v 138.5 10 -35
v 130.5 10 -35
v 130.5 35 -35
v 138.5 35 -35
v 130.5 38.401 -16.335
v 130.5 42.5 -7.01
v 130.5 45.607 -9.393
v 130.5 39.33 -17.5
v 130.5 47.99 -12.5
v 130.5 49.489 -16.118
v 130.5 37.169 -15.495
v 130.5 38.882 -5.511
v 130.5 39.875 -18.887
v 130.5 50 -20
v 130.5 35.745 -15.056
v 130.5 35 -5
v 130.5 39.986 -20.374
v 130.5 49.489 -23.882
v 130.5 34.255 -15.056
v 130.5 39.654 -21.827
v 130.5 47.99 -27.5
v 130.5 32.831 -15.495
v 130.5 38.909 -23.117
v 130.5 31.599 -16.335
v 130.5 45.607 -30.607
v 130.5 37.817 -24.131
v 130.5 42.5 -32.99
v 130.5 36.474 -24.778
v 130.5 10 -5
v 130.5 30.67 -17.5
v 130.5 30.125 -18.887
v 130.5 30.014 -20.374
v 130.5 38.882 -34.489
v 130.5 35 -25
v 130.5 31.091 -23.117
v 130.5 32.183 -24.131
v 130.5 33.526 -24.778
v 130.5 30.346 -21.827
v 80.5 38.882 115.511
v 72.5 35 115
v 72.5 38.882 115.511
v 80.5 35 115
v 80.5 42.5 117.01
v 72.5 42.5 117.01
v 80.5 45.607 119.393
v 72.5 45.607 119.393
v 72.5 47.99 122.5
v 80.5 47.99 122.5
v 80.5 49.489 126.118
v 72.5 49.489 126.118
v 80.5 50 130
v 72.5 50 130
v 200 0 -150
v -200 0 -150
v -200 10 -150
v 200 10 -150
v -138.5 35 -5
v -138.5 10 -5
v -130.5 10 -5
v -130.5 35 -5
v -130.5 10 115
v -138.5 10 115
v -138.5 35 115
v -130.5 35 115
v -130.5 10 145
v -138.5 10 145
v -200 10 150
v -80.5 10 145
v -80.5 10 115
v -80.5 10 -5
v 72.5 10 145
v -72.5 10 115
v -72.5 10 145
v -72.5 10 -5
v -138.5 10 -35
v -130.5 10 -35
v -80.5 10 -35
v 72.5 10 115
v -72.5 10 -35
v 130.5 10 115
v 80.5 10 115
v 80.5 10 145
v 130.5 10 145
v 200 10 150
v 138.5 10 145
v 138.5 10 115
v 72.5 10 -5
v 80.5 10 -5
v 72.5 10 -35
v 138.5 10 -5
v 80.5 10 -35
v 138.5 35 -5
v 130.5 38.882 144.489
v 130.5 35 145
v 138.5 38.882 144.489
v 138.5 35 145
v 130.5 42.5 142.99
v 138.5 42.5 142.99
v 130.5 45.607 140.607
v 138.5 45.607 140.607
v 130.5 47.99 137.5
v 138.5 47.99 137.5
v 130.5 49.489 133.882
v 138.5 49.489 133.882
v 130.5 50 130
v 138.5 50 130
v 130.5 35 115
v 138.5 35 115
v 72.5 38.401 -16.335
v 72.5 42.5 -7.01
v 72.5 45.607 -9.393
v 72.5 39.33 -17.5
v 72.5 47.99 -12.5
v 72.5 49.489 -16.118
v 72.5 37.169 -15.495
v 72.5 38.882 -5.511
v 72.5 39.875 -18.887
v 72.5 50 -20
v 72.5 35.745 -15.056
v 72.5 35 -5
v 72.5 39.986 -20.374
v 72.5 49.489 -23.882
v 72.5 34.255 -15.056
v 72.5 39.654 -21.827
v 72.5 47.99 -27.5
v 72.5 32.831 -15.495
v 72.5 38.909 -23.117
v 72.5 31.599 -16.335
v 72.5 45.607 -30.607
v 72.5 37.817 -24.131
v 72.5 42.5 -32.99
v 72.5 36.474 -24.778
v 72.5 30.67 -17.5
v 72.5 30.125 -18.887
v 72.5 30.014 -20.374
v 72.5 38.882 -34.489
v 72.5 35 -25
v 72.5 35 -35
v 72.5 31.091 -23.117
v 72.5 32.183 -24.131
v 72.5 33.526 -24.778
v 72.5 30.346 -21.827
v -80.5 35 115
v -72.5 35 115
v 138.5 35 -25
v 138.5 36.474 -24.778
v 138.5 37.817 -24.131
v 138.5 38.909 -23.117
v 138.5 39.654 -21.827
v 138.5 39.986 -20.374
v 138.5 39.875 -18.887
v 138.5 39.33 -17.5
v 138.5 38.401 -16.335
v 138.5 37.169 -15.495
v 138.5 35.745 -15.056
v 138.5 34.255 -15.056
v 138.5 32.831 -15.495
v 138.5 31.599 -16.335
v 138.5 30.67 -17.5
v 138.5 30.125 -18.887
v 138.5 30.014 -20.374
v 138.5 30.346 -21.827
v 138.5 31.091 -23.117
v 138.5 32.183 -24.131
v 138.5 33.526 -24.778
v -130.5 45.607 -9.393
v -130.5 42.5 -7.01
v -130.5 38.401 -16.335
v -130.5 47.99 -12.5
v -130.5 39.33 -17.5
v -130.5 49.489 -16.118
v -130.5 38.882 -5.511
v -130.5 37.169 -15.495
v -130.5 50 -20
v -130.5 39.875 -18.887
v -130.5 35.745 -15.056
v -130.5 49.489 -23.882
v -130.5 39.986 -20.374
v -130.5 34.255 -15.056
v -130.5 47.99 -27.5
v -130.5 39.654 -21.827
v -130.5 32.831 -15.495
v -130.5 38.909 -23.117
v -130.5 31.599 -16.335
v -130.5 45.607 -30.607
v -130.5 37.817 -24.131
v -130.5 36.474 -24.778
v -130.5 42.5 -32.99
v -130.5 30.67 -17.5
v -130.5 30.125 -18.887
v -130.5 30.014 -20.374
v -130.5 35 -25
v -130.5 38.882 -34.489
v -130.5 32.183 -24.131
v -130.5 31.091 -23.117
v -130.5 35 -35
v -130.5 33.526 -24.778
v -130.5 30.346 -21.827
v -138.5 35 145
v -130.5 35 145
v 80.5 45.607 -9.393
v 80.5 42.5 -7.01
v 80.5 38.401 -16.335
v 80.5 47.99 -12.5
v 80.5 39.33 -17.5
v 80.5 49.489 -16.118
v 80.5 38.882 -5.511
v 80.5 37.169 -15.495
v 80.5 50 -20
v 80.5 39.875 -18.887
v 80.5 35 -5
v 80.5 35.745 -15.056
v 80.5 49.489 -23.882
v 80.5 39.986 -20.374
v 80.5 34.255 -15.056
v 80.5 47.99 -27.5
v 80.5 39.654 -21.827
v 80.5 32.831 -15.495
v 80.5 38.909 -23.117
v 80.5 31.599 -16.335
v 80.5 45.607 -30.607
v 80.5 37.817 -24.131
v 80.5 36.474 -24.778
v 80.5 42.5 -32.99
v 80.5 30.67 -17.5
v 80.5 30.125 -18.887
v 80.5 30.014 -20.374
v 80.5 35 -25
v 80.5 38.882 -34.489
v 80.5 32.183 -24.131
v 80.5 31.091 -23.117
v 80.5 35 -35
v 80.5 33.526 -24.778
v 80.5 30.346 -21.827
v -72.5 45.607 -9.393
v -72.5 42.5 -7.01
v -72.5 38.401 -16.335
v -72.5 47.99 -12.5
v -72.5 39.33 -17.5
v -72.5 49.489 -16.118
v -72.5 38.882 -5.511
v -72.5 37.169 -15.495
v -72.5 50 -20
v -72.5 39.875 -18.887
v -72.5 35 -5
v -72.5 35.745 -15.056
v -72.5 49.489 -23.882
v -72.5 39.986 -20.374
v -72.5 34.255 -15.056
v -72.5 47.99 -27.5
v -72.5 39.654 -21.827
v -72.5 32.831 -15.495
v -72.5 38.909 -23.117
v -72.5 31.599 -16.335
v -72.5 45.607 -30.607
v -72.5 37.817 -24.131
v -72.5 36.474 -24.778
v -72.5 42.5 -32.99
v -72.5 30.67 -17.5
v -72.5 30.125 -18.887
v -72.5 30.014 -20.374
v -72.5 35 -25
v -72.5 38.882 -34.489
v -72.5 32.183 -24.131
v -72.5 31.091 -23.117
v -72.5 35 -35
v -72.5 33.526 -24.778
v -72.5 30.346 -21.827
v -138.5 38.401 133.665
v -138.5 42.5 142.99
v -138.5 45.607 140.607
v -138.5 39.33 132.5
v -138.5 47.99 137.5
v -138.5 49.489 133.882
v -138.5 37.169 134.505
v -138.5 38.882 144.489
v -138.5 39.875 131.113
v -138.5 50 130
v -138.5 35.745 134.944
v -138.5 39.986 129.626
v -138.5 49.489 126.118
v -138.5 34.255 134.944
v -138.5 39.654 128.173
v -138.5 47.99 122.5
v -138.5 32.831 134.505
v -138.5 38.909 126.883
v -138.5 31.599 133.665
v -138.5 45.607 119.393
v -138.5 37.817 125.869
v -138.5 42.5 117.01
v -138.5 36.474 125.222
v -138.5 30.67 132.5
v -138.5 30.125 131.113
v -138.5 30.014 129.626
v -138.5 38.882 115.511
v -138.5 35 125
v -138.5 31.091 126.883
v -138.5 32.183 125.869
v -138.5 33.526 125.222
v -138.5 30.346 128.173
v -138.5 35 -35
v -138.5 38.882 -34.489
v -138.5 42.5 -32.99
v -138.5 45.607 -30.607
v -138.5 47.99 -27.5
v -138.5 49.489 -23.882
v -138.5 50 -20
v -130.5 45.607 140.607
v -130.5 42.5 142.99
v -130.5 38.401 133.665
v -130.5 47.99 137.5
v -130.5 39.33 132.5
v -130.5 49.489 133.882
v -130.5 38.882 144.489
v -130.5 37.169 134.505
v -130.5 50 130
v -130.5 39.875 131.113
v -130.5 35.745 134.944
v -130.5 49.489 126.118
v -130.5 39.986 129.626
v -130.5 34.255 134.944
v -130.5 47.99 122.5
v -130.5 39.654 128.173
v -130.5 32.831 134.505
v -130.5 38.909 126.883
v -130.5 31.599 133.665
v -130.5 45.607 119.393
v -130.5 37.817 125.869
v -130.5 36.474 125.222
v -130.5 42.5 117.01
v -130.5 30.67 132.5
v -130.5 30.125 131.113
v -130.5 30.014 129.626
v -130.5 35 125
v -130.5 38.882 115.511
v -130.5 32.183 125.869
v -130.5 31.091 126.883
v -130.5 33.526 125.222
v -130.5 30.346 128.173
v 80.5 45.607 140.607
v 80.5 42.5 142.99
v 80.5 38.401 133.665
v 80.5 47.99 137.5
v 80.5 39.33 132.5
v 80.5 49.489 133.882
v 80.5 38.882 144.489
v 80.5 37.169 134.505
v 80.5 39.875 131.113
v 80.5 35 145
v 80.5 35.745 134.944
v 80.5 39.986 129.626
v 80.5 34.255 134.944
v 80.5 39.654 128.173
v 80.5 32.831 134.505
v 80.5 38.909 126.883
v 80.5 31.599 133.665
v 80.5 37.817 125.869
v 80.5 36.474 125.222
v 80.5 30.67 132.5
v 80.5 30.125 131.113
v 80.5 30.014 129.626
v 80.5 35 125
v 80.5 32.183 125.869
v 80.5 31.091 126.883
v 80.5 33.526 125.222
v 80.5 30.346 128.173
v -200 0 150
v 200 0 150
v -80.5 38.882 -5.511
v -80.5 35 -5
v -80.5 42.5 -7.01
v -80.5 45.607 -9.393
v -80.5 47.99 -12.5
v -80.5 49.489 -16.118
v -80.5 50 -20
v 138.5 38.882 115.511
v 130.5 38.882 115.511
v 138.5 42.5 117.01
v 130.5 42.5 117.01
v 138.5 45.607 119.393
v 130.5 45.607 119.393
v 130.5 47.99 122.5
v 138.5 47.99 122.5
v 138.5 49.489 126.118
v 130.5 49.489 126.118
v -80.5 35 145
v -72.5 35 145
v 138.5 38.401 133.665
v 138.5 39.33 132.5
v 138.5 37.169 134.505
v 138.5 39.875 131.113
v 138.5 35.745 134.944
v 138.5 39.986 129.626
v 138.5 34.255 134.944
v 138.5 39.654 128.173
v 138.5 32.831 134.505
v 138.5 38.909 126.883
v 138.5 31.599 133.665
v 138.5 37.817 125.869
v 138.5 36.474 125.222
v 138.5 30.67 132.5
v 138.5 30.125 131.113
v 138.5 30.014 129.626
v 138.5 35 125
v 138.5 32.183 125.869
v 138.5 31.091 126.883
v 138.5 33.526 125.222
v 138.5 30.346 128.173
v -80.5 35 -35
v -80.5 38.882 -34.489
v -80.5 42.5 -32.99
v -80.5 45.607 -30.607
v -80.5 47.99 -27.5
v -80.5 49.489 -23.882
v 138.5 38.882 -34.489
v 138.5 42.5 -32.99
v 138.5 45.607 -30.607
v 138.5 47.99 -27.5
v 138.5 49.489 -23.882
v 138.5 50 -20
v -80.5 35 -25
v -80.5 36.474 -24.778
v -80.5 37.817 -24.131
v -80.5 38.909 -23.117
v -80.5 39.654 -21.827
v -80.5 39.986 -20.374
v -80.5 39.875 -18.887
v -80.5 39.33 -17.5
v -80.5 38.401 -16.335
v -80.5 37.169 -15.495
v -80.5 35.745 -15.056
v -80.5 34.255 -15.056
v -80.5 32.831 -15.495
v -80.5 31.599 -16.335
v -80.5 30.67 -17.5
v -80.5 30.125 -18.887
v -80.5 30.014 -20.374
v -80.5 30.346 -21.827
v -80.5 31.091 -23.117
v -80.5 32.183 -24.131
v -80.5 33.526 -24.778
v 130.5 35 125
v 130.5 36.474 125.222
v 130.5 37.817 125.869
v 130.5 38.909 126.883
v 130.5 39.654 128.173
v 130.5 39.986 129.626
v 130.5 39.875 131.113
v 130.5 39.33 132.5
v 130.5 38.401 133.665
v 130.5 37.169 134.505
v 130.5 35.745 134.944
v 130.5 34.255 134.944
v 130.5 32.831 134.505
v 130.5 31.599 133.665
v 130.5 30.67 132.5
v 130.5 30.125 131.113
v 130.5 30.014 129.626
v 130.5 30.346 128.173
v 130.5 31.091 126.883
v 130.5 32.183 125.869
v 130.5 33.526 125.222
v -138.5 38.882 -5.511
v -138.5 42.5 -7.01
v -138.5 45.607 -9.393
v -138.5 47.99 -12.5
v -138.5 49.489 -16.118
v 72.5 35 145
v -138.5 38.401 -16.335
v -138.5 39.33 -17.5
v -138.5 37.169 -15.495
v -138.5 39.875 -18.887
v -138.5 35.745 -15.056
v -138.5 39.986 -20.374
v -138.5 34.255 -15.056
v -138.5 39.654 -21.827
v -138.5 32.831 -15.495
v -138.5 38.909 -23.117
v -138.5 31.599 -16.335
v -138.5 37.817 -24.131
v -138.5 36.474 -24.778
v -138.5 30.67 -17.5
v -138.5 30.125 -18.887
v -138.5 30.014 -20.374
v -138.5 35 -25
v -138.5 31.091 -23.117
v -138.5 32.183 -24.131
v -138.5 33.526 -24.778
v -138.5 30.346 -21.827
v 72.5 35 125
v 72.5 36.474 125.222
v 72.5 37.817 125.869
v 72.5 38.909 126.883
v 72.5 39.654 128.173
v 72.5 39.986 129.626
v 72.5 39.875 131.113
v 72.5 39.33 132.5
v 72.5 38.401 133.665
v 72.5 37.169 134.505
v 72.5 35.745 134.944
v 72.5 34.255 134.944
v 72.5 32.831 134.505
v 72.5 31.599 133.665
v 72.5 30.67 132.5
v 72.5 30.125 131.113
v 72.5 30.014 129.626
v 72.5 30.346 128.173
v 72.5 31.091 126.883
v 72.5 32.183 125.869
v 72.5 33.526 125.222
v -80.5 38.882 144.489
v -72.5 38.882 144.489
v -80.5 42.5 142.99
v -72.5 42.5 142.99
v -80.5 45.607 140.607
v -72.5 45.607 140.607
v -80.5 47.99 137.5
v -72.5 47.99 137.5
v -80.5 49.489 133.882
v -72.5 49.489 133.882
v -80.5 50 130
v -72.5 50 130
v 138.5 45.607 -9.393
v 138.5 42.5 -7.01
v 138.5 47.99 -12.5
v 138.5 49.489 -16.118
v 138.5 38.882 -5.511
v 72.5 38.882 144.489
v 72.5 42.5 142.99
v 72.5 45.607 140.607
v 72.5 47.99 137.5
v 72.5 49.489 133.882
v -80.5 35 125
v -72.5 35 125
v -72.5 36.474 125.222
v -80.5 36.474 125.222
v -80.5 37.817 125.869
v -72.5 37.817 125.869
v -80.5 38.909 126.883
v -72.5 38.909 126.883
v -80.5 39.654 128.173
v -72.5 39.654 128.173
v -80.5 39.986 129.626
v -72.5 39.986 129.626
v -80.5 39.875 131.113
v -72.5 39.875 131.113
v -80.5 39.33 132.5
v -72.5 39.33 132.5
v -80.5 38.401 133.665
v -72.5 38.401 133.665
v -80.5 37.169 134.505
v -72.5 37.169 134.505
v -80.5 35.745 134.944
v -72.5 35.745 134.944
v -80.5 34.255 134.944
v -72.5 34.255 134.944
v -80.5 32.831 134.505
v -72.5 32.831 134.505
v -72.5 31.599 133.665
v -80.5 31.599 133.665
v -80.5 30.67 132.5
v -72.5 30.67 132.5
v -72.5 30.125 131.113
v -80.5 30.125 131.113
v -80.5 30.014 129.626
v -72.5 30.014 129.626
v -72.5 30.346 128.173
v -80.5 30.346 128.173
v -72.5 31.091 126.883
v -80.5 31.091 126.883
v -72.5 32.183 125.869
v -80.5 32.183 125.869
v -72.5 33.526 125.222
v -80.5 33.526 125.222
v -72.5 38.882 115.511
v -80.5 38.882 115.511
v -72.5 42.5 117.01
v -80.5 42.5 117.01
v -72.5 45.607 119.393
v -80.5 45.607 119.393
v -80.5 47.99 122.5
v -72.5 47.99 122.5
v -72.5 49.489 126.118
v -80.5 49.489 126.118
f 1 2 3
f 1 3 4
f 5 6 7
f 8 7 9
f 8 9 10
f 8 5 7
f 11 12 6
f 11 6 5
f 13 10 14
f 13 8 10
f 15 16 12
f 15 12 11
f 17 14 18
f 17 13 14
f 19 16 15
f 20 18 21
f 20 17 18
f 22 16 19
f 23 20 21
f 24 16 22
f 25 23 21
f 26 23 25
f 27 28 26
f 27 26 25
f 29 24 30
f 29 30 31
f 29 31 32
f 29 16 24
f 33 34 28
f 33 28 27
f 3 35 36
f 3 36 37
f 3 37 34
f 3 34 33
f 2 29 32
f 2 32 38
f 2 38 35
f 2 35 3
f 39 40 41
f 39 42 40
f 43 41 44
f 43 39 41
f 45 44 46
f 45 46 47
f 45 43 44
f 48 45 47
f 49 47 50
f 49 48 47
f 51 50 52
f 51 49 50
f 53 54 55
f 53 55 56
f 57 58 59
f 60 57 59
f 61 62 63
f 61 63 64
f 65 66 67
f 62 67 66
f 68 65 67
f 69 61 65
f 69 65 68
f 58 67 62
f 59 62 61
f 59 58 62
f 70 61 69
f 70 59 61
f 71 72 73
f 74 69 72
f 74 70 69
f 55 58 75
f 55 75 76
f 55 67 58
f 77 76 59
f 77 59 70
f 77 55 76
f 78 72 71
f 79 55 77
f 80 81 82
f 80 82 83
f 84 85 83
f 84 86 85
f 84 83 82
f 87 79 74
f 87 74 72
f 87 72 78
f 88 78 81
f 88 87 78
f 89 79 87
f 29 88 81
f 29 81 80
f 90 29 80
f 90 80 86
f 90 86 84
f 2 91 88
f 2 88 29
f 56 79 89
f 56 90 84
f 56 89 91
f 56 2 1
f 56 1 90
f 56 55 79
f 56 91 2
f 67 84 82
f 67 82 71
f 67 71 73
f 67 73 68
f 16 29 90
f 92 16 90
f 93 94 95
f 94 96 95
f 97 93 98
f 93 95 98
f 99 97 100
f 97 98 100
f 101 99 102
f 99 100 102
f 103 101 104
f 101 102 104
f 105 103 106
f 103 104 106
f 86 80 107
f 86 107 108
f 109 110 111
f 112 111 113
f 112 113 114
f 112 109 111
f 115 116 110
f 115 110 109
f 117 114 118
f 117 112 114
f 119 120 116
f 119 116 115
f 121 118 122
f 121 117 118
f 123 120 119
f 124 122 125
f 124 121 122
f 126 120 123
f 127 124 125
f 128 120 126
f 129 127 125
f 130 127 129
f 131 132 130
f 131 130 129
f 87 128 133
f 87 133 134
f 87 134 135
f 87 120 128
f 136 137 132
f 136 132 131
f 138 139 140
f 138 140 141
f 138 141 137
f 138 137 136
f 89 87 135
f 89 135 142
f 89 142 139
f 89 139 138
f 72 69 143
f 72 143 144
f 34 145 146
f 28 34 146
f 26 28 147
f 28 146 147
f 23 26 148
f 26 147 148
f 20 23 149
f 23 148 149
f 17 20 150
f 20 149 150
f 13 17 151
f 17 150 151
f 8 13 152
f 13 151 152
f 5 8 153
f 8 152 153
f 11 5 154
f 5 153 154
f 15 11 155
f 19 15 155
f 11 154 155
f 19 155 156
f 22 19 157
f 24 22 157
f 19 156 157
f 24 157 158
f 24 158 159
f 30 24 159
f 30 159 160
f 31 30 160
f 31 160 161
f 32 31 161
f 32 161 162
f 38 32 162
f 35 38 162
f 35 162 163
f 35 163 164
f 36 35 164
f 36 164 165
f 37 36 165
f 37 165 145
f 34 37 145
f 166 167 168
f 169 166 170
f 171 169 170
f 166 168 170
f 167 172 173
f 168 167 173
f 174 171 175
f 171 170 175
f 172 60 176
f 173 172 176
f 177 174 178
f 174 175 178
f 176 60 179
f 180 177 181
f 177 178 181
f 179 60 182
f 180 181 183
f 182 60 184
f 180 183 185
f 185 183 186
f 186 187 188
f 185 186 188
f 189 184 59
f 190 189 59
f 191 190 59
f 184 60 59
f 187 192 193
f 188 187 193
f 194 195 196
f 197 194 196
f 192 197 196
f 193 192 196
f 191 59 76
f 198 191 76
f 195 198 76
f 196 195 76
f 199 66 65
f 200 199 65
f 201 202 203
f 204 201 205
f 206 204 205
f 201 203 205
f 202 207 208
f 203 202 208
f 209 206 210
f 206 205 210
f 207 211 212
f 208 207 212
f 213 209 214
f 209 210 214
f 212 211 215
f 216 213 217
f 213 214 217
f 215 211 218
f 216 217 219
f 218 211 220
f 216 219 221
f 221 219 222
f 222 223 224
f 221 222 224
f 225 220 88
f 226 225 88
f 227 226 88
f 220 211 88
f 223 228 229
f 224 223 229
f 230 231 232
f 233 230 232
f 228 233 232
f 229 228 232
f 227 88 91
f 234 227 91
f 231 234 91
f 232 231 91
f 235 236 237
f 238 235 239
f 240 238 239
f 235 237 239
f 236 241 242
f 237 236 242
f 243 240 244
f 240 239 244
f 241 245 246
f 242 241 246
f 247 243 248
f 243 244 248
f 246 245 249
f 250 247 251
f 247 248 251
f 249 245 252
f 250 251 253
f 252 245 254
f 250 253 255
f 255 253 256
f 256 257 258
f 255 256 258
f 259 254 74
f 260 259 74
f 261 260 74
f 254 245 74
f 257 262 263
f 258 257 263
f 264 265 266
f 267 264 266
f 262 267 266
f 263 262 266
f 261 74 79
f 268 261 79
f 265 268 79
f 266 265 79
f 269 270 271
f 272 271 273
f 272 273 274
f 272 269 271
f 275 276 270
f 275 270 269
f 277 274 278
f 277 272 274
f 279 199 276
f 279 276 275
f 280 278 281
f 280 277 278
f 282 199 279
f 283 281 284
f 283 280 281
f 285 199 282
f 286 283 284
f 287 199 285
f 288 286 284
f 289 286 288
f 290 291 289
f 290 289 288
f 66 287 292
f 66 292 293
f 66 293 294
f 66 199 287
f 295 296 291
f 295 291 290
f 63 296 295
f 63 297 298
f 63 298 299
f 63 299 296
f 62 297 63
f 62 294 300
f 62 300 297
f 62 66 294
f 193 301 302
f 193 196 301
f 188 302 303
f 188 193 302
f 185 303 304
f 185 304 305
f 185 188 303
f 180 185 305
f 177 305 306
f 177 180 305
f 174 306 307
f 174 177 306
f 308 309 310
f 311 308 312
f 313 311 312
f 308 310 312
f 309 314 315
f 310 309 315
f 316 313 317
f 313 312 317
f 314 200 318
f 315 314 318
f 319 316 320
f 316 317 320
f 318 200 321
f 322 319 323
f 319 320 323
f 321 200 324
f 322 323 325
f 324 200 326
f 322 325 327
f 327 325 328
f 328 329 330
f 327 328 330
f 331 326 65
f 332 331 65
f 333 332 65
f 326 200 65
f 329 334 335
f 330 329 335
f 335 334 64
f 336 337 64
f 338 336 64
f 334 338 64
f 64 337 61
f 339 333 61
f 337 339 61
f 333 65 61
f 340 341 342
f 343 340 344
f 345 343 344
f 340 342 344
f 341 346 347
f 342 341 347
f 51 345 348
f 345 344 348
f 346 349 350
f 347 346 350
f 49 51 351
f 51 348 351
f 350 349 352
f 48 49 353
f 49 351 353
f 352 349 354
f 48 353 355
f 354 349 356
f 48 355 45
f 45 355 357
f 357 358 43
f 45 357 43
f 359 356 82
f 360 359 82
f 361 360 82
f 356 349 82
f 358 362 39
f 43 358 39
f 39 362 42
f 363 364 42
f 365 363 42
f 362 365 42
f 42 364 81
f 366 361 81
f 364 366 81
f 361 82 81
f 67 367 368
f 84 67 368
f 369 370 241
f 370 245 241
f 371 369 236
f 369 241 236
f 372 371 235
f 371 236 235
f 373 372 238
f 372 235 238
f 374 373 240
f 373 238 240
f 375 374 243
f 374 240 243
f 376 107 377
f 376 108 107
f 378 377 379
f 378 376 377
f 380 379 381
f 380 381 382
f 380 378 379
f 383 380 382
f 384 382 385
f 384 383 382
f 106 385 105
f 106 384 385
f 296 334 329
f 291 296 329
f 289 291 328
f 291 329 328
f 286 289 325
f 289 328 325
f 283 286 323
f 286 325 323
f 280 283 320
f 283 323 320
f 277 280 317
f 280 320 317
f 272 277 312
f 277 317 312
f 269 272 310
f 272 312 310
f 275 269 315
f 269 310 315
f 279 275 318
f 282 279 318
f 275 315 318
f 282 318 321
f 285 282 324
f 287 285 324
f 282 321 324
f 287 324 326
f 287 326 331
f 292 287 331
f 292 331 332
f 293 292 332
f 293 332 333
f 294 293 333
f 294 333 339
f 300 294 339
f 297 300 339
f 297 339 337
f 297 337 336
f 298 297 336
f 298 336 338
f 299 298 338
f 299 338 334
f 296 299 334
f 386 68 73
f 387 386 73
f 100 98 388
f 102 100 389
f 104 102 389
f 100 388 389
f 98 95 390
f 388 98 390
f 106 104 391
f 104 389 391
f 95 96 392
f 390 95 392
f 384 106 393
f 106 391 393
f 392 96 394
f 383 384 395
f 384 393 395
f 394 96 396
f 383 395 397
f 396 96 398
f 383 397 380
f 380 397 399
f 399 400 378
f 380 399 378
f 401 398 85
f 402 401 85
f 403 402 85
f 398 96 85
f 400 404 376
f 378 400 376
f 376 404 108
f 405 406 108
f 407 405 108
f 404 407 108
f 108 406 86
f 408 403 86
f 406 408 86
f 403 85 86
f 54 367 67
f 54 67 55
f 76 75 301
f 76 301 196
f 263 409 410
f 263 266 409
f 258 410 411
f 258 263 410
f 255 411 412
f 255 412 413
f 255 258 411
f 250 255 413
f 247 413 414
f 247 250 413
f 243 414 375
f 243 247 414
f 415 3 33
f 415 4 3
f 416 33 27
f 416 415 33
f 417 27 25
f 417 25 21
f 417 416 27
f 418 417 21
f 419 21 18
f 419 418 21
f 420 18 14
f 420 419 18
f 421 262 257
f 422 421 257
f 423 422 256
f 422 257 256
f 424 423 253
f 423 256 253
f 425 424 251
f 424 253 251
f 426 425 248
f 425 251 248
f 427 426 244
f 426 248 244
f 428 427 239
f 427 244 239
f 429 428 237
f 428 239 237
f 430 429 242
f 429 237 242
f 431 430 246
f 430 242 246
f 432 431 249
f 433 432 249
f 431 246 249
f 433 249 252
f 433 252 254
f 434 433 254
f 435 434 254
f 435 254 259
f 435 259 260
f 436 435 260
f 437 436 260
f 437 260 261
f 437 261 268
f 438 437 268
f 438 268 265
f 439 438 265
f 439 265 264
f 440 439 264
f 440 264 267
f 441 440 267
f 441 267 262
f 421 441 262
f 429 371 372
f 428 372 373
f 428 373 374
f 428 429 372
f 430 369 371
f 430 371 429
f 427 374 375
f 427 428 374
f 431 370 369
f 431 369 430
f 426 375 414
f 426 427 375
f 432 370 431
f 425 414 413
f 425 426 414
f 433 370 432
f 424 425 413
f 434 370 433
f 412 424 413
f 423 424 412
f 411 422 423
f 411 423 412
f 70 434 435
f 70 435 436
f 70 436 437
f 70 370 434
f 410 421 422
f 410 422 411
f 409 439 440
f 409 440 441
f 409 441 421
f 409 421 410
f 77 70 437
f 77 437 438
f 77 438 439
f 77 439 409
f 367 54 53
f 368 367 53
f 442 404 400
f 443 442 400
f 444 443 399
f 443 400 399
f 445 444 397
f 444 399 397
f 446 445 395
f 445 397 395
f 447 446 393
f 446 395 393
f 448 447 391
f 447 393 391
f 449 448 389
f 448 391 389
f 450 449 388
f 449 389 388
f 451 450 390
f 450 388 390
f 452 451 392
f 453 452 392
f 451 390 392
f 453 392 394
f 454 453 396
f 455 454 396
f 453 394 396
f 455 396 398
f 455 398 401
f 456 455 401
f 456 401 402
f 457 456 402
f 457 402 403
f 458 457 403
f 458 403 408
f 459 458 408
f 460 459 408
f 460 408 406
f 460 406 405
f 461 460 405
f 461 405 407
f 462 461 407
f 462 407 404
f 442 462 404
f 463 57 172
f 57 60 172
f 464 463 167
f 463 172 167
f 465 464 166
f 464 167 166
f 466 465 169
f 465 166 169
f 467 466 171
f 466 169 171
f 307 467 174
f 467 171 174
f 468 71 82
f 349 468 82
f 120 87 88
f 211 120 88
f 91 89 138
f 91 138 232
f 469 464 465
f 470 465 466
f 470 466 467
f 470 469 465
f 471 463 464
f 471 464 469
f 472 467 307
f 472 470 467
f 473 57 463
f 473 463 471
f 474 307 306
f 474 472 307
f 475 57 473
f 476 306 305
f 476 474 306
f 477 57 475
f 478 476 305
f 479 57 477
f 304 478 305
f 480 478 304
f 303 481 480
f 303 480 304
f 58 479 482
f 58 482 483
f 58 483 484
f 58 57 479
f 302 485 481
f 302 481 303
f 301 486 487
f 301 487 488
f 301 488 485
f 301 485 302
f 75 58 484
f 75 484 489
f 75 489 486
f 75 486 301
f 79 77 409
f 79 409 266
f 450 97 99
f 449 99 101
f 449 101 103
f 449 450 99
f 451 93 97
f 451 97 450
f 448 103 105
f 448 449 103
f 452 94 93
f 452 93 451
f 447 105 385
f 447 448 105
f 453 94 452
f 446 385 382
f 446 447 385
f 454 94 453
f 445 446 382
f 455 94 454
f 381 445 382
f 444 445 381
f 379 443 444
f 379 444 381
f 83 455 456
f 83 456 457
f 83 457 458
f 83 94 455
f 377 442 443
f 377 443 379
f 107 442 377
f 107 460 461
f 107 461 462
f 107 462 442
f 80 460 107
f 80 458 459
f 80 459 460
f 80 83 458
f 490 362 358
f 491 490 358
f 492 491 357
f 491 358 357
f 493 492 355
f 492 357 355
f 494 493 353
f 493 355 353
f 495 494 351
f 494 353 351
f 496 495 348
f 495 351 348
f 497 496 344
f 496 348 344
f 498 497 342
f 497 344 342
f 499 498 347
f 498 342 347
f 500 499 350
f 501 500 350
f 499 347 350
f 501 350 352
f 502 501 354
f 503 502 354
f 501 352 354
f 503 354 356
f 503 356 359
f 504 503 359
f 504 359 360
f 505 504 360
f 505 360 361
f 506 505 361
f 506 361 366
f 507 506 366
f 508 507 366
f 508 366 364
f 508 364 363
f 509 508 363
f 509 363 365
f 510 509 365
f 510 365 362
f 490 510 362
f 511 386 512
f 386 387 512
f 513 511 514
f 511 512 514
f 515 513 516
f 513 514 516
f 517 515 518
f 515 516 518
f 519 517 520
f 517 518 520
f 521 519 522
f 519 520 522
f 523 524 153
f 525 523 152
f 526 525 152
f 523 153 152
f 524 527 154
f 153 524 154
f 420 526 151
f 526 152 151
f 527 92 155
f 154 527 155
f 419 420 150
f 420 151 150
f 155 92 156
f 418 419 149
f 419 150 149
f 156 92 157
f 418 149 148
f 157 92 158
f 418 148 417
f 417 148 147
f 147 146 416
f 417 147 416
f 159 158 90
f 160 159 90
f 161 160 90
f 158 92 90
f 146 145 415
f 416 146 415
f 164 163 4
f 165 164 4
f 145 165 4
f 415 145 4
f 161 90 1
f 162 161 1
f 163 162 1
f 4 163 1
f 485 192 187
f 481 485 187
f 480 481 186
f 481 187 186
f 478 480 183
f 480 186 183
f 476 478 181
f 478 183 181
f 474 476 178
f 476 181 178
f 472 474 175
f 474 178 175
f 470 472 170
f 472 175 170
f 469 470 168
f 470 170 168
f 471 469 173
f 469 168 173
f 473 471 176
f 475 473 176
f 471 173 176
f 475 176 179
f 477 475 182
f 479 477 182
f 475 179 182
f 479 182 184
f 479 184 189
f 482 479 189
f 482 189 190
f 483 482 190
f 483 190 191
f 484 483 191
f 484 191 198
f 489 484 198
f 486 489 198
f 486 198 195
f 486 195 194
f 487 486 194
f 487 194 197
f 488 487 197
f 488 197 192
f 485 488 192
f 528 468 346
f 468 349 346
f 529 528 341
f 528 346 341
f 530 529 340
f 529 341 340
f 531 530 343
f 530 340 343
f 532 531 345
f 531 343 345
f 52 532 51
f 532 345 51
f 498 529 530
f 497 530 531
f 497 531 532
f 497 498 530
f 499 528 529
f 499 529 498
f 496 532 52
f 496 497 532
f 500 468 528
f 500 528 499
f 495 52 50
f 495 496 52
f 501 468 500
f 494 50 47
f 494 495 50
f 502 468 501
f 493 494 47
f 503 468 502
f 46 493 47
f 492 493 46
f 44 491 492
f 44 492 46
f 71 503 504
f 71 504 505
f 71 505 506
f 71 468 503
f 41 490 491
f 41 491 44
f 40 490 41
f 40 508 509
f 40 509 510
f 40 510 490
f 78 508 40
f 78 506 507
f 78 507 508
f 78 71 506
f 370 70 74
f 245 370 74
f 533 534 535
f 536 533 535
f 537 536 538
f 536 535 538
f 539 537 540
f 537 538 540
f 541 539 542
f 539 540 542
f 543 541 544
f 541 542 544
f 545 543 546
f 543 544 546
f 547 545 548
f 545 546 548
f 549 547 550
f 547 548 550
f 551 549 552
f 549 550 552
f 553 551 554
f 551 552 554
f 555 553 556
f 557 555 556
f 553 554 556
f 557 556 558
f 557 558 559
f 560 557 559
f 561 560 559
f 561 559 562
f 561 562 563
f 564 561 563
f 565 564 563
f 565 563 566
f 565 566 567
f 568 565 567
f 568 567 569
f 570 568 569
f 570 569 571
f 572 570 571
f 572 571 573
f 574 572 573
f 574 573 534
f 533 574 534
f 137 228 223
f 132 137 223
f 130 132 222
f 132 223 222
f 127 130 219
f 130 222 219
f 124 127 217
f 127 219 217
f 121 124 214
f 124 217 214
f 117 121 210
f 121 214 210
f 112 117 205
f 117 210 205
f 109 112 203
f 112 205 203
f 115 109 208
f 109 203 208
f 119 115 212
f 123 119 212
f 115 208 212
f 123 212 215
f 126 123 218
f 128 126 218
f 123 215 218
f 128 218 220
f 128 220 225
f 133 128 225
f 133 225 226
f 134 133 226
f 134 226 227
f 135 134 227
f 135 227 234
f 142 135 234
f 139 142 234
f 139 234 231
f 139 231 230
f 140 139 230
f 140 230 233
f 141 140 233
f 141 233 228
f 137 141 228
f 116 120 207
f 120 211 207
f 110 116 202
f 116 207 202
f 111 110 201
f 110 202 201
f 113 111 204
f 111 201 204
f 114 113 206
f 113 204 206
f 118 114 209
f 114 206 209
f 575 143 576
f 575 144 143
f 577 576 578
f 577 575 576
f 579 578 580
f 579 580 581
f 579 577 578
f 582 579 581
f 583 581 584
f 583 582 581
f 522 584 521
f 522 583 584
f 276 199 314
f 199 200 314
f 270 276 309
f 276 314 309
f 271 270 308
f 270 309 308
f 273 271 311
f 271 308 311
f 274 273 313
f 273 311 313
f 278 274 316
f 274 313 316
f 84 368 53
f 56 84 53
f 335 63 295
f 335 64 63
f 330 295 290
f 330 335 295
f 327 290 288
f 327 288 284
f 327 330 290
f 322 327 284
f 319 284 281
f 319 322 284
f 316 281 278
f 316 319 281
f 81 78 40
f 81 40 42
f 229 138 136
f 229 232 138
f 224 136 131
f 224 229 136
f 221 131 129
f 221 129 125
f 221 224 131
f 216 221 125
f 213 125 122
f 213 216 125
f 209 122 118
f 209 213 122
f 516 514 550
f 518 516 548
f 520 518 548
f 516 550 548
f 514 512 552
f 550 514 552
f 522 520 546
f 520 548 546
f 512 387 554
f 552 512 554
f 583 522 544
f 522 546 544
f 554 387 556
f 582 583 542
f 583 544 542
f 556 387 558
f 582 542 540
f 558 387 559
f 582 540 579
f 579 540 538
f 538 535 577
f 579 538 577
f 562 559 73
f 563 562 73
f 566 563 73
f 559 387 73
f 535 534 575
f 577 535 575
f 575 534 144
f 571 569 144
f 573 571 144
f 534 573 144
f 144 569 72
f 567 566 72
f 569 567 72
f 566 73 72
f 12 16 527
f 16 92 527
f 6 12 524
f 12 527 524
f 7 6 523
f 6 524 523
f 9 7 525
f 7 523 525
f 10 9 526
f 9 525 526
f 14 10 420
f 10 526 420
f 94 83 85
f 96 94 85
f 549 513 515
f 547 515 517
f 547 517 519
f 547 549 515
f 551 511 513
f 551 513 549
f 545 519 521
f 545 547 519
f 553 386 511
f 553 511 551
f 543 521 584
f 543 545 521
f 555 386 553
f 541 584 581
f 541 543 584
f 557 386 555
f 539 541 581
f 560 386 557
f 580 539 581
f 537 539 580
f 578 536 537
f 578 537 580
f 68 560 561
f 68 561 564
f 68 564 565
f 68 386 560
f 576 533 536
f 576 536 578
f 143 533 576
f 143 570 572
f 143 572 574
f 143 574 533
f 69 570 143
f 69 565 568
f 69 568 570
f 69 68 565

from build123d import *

# Parameters (mm, degrees)
SKETCH1_W           = 400
SKETCH1_H           = 300
BOSS_EXTRUDE1_DEPTH = 10
SKETCH2_W           = 8
SKETCH2_H           = 30
BOSS_EXTRUDE2_DEPTH = 40
SKETCH3_R           = 5
CUT_EXTRUDE1_DEPTH  = 374.607079697
FILLET1_R           = 15
SKETCH4_W           = 8
SKETCH4_H           = 30
BOSS_EXTRUDE3_DEPTH = 40
SKETCH5_R           = 5
CUT_EXTRUDE2_DEPTH  = 374.607079697
FILLET2_R           = 15


with BuildPart() as part:
    # Sketch1 → Boss-Extrude1 (new body)
    with BuildSketch(Plane(origin=(0, 0, 0), x_dir=(1, 0, 0), z_dir=(0, 1, 0))):
        Rectangle(SKETCH1_W, SKETCH1_H)
    extrude(amount=BOSS_EXTRUDE1_DEPTH)

    # Sketch2 → Boss-Extrude2 (add)
    with BuildSketch(Plane(origin=(0, 10, 0), x_dir=(1, 0, 0), z_dir=(0, 1, 0))):
        with Locations((-134.5, -130)):
            Rectangle(SKETCH2_W, SKETCH2_H)
        with Locations((-76.5, -130)):
            Rectangle(SKETCH2_W, SKETCH2_H)
        with Locations((76.5, -130)):
            Rectangle(SKETCH2_W, SKETCH2_H)
        with Locations((134.5, -130)):
            Rectangle(SKETCH2_W, SKETCH2_H)
    extrude(amount=BOSS_EXTRUDE2_DEPTH)

    # Sketch3 → Cut-Extrude1 (cut, through all)
    with BuildSketch(Plane(origin=(138.5, 0, 0), x_dir=(0, 0, -1), z_dir=(1, 0, 0))):
        with Locations((-130, 35)):
            Circle(SKETCH3_R)
    extrude(amount=-CUT_EXTRUDE1_DEPTH, mode=Mode.SUBTRACT)

    # Fillet1
    fillet1_edges = [part.edges().sort_by_distance(p)[0] for p in [
        (134.5, 50, 115),
        (134.5, 50, 145),
        (76.5, 50, 145),
        (76.5, 50, 115),
        (-76.5, 50, 115),
        (-134.5, 50, 115),
        (-76.5, 50, 145),
        (-134.5, 50, 145),
    ]]
    fillet(fillet1_edges, radius=FILLET1_R - 0.0001)  # a hair under: the kernel refuses the full size

    # Sketch4 → Boss-Extrude3 (add)
    with BuildSketch(Plane(origin=(0, 10, 0), x_dir=(1, 0, 0), z_dir=(0, 1, 0))):
        with Locations((-134.5, 20)):
            Rectangle(SKETCH4_W, SKETCH4_H)
        with Locations((-76.5, 20)):
            Rectangle(SKETCH4_W, SKETCH4_H)
        with Locations((134.5, 20)):
            Rectangle(SKETCH4_W, SKETCH4_H)
        with Locations((76.5, 20)):
            Rectangle(SKETCH4_W, SKETCH4_H)
    extrude(amount=BOSS_EXTRUDE3_DEPTH)

    # Sketch5 → Cut-Extrude2 (cut, through all)
    with BuildSketch(Plane(origin=(138.5, 0, 0), x_dir=(0, 0, -1), z_dir=(1, 0, 0))):
        with Locations((20, 35)):
            Circle(SKETCH5_R)
    extrude(amount=-CUT_EXTRUDE2_DEPTH, mode=Mode.SUBTRACT)

    # Fillet2
    fillet2_edges = [part.edges().sort_by_distance(p)[0] for p in [
        (-134.5, 50, -35),
        (-76.5, 50, -35),
        (134.5, 50, -35),
        (76.5, 50, -35),
        (-134.5, 50, -5),
        (-76.5, 50, -5),
        (76.5, 50, -5),
        (134.5, 50, -5),
    ]]
    fillet(fillet2_edges, radius=FILLET2_R - 0.0001)  # a hair under: the kernel refuses the full size


solid = part.part
